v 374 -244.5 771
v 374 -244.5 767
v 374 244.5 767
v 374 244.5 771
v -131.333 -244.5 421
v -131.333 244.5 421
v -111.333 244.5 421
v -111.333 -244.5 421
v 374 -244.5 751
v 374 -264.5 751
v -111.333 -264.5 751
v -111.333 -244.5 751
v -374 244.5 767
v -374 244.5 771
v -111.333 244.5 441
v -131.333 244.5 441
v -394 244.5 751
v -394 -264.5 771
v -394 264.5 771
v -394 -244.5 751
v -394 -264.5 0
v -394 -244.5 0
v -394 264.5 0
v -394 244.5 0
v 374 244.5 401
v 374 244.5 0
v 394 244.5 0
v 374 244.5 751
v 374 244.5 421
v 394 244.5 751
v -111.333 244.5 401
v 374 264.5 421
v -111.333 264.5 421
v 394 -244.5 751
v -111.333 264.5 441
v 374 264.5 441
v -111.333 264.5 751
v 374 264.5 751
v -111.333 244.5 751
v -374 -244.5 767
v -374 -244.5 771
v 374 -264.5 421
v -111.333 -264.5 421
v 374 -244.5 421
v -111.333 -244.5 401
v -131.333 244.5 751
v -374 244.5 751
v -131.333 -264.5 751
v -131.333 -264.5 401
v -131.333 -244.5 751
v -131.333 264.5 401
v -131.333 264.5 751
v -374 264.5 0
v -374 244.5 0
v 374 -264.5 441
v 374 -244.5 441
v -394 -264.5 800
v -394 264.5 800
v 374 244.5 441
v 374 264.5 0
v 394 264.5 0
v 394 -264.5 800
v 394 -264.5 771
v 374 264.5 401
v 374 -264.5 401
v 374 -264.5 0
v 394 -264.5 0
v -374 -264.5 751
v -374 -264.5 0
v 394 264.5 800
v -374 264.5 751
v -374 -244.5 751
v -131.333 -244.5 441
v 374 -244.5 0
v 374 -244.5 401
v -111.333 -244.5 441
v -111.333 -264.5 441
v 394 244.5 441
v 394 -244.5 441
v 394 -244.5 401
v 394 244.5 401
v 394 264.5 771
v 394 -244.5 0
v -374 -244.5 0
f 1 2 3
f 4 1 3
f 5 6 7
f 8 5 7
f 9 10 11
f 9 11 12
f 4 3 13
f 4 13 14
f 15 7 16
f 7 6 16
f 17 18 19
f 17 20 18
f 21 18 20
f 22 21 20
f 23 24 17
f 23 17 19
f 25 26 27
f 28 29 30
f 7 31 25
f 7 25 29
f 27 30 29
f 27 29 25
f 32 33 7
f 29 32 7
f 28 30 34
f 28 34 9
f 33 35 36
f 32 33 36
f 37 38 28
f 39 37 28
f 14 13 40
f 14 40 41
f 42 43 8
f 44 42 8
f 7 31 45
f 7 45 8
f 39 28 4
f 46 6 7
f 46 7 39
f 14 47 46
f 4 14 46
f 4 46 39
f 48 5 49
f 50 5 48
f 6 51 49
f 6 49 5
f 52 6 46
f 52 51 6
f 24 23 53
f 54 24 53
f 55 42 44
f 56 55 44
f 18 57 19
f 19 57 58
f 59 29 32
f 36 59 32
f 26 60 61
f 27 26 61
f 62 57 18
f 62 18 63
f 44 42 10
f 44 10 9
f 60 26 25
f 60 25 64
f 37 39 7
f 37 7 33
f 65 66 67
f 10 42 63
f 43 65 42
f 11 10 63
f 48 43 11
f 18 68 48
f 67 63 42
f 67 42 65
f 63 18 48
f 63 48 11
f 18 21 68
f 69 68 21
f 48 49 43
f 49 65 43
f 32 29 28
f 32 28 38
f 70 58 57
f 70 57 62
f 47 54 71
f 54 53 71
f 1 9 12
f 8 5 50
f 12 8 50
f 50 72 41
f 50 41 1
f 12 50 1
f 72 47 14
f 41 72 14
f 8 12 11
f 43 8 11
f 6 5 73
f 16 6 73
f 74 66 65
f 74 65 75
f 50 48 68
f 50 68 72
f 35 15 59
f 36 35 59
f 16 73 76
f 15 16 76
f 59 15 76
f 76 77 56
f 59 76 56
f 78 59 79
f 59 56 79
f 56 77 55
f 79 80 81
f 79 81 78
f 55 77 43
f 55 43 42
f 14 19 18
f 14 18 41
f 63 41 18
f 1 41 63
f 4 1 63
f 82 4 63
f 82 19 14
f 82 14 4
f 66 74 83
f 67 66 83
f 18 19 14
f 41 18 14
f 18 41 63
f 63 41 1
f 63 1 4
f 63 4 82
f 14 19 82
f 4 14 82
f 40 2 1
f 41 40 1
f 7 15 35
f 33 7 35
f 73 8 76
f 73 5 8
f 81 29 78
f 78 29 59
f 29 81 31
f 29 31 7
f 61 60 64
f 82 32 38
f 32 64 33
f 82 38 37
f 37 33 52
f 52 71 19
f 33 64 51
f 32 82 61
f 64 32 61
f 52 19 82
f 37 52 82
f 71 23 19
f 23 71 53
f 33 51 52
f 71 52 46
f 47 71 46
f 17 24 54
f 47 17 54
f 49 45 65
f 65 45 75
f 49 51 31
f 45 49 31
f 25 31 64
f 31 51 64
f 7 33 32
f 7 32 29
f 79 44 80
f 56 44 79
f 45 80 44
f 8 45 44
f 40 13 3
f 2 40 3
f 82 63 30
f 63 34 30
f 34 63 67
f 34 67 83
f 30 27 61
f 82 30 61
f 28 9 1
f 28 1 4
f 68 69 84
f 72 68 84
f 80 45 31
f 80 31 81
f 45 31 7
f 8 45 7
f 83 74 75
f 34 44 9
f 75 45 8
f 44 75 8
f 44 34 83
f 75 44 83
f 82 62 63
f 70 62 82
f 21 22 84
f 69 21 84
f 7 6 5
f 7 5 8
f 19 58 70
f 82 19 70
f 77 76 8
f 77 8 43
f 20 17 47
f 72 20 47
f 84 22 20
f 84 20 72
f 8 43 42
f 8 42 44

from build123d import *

# Parameters (mm, degrees)
F4_W           = 20
F4_H           = 20
F5_DEPTH       = 771
F6_W           = 20
F6_H           = 20
F7_DEPTH       = 748
F9_W           = 20
F9_H           = 20
F10_DEPTH      = 489
F13_W          = 788
F13_H          = 529
F14_DEPTH      = 29
F14_DEPTH_BACK = 4
F16_W          = 20
F16_H          = 20
F17_DEPTH      = 350
F18_W          = 20
F18_H          = 20
F19_DEPTH      = 485.3333333333
F21_W          = 20
F21_H          = 20
F22_DEPTH      = 489
F23_W          = 525.3333333333
F23_H          = 40
F24_DEPTH      = 529


with BuildPart() as f5:
    # F4 (on Top) → F5 (new body)
    with BuildSketch(Plane.XY):
        with Locations((-384, 254.5)):
            Rectangle(F4_W, F4_H)
    extrude(amount=F5_DEPTH)


with BuildPart() as f5b:
    # F4 (on Top) → F5, piece 2 (new body)
    with BuildSketch(Plane.XY):
        with Locations((384, 254.5)):
            Rectangle(F4_W, F4_H)
    extrude(amount=F5_DEPTH)


with BuildPart() as f5c:
    # F4 (on Top) → F5, piece 3 (new body)
    with BuildSketch(Plane.XY):
        with Locations((384, -254.5)):
            Rectangle(F4_W, F4_H)
    extrude(amount=F5_DEPTH)


with BuildPart() as f5d:
    # F4 (on Top) → F5, piece 4 (new body)
    with BuildSketch(Plane.XY):
        with Locations((-384, -254.5)):
            Rectangle(F4_W, F4_H)
    extrude(amount=F5_DEPTH)


with BuildPart() as f7:
    # F6 (on face) → F7 (new body, through all)
    with BuildSketch(Plane(origin=(374, 0, 0), x_dir=(0, -1, 0), z_dir=(-1, 0, 0))):
        with Locations((-254.5, 761)):
            Rectangle(F6_W, F6_H)
    extrude(amount=F7_DEPTH)


with BuildPart() as f8_1:
    # F8: instance of F7
    add(f7.part.mirror(Plane.XZ))


with BuildPart() as f10:
    # F9 (on face) → F10 (new body, through all)
    with BuildSketch(Plane.XZ.offset(-244.5)):
        with Locations((-384, 761)):
            Rectangle(F9_W, F9_H)
    extrude(amount=F10_DEPTH)


with BuildPart() as f11_1:
    # F11: instance of F10
    add(f10.part.mirror(Plane.YZ))


with BuildPart() as f5_1:
    add(f5.part)

    # F12: union F11_1, F5b, F10, F5c, F8_1, F7, F5d
    add(f11_1.part)
    add(f5b.part)
    add(f10.part)
    add(f5c.part)
    add(f8_1.part)
    add(f7.part)
    add(f5d.part)


with BuildPart() as f14:
    # F13 (on face) → F14 (new body, two sides)
    with BuildSketch(Plane.XY.offset(771)) as f14_sk:
        Rectangle(F13_W, F13_H)
    extrude(amount=F14_DEPTH)
    extrude(f14_sk.sketch, amount=-F14_DEPTH_BACK)

    # F15: cut F5
    add(f5_1.part, mode=Mode.SUBTRACT)


with BuildPart() as f17:
    # F16 (on face) → F17 (new body)
    with BuildSketch(Plane(origin=(0, 0, 751), x_dir=(1, 0, 0), z_dir=(0, 0, -1))):
        with Locations((-121.3333333333, 254.5)):
            Rectangle(F16_W, F16_H)
    extrude(amount=F17_DEPTH)


with BuildPart() as f19:
    # F18 (on face) → F19 (new body, through all)
    with BuildSketch(Plane.YZ.offset(-111.3333333333)):
        with Locations((-254.5, 411)):
            Rectangle(F18_W, F18_H)
    extrude(amount=F19_DEPTH)


with BuildPart() as f5_2:
    add(f5_1.part)

    # F20: F17, F19 across plane
    add(f17.part.mirror(Plane.XZ))
    add(f19.part.mirror(Plane.XZ))

    add(f17.part)  # F22 merges F17

    add(f19.part)  # F22 merges F19
    # F21 (on face) → F22 (join, through all)
    with BuildSketch(Plane.XZ.offset(-244.5)):
        with Locations((-121.3333333333, 411)):
            Rectangle(F21_W, F21_H)
    extrude(amount=F22_DEPTH)


with BuildPart() as f24:
    # F23 (on face) → F24 (new body)
    with BuildSketch(Plane.XZ.offset(264.5)):
        with Locations((131.3333333333, 421)):
            Rectangle(F23_W, F23_H)
    extrude(amount=-F24_DEPTH)

    # F25: cut F5
    add(f5_2.part, mode=Mode.SUBTRACT)


solid = Compound([f14.part, f5_2.part, f24.part])
